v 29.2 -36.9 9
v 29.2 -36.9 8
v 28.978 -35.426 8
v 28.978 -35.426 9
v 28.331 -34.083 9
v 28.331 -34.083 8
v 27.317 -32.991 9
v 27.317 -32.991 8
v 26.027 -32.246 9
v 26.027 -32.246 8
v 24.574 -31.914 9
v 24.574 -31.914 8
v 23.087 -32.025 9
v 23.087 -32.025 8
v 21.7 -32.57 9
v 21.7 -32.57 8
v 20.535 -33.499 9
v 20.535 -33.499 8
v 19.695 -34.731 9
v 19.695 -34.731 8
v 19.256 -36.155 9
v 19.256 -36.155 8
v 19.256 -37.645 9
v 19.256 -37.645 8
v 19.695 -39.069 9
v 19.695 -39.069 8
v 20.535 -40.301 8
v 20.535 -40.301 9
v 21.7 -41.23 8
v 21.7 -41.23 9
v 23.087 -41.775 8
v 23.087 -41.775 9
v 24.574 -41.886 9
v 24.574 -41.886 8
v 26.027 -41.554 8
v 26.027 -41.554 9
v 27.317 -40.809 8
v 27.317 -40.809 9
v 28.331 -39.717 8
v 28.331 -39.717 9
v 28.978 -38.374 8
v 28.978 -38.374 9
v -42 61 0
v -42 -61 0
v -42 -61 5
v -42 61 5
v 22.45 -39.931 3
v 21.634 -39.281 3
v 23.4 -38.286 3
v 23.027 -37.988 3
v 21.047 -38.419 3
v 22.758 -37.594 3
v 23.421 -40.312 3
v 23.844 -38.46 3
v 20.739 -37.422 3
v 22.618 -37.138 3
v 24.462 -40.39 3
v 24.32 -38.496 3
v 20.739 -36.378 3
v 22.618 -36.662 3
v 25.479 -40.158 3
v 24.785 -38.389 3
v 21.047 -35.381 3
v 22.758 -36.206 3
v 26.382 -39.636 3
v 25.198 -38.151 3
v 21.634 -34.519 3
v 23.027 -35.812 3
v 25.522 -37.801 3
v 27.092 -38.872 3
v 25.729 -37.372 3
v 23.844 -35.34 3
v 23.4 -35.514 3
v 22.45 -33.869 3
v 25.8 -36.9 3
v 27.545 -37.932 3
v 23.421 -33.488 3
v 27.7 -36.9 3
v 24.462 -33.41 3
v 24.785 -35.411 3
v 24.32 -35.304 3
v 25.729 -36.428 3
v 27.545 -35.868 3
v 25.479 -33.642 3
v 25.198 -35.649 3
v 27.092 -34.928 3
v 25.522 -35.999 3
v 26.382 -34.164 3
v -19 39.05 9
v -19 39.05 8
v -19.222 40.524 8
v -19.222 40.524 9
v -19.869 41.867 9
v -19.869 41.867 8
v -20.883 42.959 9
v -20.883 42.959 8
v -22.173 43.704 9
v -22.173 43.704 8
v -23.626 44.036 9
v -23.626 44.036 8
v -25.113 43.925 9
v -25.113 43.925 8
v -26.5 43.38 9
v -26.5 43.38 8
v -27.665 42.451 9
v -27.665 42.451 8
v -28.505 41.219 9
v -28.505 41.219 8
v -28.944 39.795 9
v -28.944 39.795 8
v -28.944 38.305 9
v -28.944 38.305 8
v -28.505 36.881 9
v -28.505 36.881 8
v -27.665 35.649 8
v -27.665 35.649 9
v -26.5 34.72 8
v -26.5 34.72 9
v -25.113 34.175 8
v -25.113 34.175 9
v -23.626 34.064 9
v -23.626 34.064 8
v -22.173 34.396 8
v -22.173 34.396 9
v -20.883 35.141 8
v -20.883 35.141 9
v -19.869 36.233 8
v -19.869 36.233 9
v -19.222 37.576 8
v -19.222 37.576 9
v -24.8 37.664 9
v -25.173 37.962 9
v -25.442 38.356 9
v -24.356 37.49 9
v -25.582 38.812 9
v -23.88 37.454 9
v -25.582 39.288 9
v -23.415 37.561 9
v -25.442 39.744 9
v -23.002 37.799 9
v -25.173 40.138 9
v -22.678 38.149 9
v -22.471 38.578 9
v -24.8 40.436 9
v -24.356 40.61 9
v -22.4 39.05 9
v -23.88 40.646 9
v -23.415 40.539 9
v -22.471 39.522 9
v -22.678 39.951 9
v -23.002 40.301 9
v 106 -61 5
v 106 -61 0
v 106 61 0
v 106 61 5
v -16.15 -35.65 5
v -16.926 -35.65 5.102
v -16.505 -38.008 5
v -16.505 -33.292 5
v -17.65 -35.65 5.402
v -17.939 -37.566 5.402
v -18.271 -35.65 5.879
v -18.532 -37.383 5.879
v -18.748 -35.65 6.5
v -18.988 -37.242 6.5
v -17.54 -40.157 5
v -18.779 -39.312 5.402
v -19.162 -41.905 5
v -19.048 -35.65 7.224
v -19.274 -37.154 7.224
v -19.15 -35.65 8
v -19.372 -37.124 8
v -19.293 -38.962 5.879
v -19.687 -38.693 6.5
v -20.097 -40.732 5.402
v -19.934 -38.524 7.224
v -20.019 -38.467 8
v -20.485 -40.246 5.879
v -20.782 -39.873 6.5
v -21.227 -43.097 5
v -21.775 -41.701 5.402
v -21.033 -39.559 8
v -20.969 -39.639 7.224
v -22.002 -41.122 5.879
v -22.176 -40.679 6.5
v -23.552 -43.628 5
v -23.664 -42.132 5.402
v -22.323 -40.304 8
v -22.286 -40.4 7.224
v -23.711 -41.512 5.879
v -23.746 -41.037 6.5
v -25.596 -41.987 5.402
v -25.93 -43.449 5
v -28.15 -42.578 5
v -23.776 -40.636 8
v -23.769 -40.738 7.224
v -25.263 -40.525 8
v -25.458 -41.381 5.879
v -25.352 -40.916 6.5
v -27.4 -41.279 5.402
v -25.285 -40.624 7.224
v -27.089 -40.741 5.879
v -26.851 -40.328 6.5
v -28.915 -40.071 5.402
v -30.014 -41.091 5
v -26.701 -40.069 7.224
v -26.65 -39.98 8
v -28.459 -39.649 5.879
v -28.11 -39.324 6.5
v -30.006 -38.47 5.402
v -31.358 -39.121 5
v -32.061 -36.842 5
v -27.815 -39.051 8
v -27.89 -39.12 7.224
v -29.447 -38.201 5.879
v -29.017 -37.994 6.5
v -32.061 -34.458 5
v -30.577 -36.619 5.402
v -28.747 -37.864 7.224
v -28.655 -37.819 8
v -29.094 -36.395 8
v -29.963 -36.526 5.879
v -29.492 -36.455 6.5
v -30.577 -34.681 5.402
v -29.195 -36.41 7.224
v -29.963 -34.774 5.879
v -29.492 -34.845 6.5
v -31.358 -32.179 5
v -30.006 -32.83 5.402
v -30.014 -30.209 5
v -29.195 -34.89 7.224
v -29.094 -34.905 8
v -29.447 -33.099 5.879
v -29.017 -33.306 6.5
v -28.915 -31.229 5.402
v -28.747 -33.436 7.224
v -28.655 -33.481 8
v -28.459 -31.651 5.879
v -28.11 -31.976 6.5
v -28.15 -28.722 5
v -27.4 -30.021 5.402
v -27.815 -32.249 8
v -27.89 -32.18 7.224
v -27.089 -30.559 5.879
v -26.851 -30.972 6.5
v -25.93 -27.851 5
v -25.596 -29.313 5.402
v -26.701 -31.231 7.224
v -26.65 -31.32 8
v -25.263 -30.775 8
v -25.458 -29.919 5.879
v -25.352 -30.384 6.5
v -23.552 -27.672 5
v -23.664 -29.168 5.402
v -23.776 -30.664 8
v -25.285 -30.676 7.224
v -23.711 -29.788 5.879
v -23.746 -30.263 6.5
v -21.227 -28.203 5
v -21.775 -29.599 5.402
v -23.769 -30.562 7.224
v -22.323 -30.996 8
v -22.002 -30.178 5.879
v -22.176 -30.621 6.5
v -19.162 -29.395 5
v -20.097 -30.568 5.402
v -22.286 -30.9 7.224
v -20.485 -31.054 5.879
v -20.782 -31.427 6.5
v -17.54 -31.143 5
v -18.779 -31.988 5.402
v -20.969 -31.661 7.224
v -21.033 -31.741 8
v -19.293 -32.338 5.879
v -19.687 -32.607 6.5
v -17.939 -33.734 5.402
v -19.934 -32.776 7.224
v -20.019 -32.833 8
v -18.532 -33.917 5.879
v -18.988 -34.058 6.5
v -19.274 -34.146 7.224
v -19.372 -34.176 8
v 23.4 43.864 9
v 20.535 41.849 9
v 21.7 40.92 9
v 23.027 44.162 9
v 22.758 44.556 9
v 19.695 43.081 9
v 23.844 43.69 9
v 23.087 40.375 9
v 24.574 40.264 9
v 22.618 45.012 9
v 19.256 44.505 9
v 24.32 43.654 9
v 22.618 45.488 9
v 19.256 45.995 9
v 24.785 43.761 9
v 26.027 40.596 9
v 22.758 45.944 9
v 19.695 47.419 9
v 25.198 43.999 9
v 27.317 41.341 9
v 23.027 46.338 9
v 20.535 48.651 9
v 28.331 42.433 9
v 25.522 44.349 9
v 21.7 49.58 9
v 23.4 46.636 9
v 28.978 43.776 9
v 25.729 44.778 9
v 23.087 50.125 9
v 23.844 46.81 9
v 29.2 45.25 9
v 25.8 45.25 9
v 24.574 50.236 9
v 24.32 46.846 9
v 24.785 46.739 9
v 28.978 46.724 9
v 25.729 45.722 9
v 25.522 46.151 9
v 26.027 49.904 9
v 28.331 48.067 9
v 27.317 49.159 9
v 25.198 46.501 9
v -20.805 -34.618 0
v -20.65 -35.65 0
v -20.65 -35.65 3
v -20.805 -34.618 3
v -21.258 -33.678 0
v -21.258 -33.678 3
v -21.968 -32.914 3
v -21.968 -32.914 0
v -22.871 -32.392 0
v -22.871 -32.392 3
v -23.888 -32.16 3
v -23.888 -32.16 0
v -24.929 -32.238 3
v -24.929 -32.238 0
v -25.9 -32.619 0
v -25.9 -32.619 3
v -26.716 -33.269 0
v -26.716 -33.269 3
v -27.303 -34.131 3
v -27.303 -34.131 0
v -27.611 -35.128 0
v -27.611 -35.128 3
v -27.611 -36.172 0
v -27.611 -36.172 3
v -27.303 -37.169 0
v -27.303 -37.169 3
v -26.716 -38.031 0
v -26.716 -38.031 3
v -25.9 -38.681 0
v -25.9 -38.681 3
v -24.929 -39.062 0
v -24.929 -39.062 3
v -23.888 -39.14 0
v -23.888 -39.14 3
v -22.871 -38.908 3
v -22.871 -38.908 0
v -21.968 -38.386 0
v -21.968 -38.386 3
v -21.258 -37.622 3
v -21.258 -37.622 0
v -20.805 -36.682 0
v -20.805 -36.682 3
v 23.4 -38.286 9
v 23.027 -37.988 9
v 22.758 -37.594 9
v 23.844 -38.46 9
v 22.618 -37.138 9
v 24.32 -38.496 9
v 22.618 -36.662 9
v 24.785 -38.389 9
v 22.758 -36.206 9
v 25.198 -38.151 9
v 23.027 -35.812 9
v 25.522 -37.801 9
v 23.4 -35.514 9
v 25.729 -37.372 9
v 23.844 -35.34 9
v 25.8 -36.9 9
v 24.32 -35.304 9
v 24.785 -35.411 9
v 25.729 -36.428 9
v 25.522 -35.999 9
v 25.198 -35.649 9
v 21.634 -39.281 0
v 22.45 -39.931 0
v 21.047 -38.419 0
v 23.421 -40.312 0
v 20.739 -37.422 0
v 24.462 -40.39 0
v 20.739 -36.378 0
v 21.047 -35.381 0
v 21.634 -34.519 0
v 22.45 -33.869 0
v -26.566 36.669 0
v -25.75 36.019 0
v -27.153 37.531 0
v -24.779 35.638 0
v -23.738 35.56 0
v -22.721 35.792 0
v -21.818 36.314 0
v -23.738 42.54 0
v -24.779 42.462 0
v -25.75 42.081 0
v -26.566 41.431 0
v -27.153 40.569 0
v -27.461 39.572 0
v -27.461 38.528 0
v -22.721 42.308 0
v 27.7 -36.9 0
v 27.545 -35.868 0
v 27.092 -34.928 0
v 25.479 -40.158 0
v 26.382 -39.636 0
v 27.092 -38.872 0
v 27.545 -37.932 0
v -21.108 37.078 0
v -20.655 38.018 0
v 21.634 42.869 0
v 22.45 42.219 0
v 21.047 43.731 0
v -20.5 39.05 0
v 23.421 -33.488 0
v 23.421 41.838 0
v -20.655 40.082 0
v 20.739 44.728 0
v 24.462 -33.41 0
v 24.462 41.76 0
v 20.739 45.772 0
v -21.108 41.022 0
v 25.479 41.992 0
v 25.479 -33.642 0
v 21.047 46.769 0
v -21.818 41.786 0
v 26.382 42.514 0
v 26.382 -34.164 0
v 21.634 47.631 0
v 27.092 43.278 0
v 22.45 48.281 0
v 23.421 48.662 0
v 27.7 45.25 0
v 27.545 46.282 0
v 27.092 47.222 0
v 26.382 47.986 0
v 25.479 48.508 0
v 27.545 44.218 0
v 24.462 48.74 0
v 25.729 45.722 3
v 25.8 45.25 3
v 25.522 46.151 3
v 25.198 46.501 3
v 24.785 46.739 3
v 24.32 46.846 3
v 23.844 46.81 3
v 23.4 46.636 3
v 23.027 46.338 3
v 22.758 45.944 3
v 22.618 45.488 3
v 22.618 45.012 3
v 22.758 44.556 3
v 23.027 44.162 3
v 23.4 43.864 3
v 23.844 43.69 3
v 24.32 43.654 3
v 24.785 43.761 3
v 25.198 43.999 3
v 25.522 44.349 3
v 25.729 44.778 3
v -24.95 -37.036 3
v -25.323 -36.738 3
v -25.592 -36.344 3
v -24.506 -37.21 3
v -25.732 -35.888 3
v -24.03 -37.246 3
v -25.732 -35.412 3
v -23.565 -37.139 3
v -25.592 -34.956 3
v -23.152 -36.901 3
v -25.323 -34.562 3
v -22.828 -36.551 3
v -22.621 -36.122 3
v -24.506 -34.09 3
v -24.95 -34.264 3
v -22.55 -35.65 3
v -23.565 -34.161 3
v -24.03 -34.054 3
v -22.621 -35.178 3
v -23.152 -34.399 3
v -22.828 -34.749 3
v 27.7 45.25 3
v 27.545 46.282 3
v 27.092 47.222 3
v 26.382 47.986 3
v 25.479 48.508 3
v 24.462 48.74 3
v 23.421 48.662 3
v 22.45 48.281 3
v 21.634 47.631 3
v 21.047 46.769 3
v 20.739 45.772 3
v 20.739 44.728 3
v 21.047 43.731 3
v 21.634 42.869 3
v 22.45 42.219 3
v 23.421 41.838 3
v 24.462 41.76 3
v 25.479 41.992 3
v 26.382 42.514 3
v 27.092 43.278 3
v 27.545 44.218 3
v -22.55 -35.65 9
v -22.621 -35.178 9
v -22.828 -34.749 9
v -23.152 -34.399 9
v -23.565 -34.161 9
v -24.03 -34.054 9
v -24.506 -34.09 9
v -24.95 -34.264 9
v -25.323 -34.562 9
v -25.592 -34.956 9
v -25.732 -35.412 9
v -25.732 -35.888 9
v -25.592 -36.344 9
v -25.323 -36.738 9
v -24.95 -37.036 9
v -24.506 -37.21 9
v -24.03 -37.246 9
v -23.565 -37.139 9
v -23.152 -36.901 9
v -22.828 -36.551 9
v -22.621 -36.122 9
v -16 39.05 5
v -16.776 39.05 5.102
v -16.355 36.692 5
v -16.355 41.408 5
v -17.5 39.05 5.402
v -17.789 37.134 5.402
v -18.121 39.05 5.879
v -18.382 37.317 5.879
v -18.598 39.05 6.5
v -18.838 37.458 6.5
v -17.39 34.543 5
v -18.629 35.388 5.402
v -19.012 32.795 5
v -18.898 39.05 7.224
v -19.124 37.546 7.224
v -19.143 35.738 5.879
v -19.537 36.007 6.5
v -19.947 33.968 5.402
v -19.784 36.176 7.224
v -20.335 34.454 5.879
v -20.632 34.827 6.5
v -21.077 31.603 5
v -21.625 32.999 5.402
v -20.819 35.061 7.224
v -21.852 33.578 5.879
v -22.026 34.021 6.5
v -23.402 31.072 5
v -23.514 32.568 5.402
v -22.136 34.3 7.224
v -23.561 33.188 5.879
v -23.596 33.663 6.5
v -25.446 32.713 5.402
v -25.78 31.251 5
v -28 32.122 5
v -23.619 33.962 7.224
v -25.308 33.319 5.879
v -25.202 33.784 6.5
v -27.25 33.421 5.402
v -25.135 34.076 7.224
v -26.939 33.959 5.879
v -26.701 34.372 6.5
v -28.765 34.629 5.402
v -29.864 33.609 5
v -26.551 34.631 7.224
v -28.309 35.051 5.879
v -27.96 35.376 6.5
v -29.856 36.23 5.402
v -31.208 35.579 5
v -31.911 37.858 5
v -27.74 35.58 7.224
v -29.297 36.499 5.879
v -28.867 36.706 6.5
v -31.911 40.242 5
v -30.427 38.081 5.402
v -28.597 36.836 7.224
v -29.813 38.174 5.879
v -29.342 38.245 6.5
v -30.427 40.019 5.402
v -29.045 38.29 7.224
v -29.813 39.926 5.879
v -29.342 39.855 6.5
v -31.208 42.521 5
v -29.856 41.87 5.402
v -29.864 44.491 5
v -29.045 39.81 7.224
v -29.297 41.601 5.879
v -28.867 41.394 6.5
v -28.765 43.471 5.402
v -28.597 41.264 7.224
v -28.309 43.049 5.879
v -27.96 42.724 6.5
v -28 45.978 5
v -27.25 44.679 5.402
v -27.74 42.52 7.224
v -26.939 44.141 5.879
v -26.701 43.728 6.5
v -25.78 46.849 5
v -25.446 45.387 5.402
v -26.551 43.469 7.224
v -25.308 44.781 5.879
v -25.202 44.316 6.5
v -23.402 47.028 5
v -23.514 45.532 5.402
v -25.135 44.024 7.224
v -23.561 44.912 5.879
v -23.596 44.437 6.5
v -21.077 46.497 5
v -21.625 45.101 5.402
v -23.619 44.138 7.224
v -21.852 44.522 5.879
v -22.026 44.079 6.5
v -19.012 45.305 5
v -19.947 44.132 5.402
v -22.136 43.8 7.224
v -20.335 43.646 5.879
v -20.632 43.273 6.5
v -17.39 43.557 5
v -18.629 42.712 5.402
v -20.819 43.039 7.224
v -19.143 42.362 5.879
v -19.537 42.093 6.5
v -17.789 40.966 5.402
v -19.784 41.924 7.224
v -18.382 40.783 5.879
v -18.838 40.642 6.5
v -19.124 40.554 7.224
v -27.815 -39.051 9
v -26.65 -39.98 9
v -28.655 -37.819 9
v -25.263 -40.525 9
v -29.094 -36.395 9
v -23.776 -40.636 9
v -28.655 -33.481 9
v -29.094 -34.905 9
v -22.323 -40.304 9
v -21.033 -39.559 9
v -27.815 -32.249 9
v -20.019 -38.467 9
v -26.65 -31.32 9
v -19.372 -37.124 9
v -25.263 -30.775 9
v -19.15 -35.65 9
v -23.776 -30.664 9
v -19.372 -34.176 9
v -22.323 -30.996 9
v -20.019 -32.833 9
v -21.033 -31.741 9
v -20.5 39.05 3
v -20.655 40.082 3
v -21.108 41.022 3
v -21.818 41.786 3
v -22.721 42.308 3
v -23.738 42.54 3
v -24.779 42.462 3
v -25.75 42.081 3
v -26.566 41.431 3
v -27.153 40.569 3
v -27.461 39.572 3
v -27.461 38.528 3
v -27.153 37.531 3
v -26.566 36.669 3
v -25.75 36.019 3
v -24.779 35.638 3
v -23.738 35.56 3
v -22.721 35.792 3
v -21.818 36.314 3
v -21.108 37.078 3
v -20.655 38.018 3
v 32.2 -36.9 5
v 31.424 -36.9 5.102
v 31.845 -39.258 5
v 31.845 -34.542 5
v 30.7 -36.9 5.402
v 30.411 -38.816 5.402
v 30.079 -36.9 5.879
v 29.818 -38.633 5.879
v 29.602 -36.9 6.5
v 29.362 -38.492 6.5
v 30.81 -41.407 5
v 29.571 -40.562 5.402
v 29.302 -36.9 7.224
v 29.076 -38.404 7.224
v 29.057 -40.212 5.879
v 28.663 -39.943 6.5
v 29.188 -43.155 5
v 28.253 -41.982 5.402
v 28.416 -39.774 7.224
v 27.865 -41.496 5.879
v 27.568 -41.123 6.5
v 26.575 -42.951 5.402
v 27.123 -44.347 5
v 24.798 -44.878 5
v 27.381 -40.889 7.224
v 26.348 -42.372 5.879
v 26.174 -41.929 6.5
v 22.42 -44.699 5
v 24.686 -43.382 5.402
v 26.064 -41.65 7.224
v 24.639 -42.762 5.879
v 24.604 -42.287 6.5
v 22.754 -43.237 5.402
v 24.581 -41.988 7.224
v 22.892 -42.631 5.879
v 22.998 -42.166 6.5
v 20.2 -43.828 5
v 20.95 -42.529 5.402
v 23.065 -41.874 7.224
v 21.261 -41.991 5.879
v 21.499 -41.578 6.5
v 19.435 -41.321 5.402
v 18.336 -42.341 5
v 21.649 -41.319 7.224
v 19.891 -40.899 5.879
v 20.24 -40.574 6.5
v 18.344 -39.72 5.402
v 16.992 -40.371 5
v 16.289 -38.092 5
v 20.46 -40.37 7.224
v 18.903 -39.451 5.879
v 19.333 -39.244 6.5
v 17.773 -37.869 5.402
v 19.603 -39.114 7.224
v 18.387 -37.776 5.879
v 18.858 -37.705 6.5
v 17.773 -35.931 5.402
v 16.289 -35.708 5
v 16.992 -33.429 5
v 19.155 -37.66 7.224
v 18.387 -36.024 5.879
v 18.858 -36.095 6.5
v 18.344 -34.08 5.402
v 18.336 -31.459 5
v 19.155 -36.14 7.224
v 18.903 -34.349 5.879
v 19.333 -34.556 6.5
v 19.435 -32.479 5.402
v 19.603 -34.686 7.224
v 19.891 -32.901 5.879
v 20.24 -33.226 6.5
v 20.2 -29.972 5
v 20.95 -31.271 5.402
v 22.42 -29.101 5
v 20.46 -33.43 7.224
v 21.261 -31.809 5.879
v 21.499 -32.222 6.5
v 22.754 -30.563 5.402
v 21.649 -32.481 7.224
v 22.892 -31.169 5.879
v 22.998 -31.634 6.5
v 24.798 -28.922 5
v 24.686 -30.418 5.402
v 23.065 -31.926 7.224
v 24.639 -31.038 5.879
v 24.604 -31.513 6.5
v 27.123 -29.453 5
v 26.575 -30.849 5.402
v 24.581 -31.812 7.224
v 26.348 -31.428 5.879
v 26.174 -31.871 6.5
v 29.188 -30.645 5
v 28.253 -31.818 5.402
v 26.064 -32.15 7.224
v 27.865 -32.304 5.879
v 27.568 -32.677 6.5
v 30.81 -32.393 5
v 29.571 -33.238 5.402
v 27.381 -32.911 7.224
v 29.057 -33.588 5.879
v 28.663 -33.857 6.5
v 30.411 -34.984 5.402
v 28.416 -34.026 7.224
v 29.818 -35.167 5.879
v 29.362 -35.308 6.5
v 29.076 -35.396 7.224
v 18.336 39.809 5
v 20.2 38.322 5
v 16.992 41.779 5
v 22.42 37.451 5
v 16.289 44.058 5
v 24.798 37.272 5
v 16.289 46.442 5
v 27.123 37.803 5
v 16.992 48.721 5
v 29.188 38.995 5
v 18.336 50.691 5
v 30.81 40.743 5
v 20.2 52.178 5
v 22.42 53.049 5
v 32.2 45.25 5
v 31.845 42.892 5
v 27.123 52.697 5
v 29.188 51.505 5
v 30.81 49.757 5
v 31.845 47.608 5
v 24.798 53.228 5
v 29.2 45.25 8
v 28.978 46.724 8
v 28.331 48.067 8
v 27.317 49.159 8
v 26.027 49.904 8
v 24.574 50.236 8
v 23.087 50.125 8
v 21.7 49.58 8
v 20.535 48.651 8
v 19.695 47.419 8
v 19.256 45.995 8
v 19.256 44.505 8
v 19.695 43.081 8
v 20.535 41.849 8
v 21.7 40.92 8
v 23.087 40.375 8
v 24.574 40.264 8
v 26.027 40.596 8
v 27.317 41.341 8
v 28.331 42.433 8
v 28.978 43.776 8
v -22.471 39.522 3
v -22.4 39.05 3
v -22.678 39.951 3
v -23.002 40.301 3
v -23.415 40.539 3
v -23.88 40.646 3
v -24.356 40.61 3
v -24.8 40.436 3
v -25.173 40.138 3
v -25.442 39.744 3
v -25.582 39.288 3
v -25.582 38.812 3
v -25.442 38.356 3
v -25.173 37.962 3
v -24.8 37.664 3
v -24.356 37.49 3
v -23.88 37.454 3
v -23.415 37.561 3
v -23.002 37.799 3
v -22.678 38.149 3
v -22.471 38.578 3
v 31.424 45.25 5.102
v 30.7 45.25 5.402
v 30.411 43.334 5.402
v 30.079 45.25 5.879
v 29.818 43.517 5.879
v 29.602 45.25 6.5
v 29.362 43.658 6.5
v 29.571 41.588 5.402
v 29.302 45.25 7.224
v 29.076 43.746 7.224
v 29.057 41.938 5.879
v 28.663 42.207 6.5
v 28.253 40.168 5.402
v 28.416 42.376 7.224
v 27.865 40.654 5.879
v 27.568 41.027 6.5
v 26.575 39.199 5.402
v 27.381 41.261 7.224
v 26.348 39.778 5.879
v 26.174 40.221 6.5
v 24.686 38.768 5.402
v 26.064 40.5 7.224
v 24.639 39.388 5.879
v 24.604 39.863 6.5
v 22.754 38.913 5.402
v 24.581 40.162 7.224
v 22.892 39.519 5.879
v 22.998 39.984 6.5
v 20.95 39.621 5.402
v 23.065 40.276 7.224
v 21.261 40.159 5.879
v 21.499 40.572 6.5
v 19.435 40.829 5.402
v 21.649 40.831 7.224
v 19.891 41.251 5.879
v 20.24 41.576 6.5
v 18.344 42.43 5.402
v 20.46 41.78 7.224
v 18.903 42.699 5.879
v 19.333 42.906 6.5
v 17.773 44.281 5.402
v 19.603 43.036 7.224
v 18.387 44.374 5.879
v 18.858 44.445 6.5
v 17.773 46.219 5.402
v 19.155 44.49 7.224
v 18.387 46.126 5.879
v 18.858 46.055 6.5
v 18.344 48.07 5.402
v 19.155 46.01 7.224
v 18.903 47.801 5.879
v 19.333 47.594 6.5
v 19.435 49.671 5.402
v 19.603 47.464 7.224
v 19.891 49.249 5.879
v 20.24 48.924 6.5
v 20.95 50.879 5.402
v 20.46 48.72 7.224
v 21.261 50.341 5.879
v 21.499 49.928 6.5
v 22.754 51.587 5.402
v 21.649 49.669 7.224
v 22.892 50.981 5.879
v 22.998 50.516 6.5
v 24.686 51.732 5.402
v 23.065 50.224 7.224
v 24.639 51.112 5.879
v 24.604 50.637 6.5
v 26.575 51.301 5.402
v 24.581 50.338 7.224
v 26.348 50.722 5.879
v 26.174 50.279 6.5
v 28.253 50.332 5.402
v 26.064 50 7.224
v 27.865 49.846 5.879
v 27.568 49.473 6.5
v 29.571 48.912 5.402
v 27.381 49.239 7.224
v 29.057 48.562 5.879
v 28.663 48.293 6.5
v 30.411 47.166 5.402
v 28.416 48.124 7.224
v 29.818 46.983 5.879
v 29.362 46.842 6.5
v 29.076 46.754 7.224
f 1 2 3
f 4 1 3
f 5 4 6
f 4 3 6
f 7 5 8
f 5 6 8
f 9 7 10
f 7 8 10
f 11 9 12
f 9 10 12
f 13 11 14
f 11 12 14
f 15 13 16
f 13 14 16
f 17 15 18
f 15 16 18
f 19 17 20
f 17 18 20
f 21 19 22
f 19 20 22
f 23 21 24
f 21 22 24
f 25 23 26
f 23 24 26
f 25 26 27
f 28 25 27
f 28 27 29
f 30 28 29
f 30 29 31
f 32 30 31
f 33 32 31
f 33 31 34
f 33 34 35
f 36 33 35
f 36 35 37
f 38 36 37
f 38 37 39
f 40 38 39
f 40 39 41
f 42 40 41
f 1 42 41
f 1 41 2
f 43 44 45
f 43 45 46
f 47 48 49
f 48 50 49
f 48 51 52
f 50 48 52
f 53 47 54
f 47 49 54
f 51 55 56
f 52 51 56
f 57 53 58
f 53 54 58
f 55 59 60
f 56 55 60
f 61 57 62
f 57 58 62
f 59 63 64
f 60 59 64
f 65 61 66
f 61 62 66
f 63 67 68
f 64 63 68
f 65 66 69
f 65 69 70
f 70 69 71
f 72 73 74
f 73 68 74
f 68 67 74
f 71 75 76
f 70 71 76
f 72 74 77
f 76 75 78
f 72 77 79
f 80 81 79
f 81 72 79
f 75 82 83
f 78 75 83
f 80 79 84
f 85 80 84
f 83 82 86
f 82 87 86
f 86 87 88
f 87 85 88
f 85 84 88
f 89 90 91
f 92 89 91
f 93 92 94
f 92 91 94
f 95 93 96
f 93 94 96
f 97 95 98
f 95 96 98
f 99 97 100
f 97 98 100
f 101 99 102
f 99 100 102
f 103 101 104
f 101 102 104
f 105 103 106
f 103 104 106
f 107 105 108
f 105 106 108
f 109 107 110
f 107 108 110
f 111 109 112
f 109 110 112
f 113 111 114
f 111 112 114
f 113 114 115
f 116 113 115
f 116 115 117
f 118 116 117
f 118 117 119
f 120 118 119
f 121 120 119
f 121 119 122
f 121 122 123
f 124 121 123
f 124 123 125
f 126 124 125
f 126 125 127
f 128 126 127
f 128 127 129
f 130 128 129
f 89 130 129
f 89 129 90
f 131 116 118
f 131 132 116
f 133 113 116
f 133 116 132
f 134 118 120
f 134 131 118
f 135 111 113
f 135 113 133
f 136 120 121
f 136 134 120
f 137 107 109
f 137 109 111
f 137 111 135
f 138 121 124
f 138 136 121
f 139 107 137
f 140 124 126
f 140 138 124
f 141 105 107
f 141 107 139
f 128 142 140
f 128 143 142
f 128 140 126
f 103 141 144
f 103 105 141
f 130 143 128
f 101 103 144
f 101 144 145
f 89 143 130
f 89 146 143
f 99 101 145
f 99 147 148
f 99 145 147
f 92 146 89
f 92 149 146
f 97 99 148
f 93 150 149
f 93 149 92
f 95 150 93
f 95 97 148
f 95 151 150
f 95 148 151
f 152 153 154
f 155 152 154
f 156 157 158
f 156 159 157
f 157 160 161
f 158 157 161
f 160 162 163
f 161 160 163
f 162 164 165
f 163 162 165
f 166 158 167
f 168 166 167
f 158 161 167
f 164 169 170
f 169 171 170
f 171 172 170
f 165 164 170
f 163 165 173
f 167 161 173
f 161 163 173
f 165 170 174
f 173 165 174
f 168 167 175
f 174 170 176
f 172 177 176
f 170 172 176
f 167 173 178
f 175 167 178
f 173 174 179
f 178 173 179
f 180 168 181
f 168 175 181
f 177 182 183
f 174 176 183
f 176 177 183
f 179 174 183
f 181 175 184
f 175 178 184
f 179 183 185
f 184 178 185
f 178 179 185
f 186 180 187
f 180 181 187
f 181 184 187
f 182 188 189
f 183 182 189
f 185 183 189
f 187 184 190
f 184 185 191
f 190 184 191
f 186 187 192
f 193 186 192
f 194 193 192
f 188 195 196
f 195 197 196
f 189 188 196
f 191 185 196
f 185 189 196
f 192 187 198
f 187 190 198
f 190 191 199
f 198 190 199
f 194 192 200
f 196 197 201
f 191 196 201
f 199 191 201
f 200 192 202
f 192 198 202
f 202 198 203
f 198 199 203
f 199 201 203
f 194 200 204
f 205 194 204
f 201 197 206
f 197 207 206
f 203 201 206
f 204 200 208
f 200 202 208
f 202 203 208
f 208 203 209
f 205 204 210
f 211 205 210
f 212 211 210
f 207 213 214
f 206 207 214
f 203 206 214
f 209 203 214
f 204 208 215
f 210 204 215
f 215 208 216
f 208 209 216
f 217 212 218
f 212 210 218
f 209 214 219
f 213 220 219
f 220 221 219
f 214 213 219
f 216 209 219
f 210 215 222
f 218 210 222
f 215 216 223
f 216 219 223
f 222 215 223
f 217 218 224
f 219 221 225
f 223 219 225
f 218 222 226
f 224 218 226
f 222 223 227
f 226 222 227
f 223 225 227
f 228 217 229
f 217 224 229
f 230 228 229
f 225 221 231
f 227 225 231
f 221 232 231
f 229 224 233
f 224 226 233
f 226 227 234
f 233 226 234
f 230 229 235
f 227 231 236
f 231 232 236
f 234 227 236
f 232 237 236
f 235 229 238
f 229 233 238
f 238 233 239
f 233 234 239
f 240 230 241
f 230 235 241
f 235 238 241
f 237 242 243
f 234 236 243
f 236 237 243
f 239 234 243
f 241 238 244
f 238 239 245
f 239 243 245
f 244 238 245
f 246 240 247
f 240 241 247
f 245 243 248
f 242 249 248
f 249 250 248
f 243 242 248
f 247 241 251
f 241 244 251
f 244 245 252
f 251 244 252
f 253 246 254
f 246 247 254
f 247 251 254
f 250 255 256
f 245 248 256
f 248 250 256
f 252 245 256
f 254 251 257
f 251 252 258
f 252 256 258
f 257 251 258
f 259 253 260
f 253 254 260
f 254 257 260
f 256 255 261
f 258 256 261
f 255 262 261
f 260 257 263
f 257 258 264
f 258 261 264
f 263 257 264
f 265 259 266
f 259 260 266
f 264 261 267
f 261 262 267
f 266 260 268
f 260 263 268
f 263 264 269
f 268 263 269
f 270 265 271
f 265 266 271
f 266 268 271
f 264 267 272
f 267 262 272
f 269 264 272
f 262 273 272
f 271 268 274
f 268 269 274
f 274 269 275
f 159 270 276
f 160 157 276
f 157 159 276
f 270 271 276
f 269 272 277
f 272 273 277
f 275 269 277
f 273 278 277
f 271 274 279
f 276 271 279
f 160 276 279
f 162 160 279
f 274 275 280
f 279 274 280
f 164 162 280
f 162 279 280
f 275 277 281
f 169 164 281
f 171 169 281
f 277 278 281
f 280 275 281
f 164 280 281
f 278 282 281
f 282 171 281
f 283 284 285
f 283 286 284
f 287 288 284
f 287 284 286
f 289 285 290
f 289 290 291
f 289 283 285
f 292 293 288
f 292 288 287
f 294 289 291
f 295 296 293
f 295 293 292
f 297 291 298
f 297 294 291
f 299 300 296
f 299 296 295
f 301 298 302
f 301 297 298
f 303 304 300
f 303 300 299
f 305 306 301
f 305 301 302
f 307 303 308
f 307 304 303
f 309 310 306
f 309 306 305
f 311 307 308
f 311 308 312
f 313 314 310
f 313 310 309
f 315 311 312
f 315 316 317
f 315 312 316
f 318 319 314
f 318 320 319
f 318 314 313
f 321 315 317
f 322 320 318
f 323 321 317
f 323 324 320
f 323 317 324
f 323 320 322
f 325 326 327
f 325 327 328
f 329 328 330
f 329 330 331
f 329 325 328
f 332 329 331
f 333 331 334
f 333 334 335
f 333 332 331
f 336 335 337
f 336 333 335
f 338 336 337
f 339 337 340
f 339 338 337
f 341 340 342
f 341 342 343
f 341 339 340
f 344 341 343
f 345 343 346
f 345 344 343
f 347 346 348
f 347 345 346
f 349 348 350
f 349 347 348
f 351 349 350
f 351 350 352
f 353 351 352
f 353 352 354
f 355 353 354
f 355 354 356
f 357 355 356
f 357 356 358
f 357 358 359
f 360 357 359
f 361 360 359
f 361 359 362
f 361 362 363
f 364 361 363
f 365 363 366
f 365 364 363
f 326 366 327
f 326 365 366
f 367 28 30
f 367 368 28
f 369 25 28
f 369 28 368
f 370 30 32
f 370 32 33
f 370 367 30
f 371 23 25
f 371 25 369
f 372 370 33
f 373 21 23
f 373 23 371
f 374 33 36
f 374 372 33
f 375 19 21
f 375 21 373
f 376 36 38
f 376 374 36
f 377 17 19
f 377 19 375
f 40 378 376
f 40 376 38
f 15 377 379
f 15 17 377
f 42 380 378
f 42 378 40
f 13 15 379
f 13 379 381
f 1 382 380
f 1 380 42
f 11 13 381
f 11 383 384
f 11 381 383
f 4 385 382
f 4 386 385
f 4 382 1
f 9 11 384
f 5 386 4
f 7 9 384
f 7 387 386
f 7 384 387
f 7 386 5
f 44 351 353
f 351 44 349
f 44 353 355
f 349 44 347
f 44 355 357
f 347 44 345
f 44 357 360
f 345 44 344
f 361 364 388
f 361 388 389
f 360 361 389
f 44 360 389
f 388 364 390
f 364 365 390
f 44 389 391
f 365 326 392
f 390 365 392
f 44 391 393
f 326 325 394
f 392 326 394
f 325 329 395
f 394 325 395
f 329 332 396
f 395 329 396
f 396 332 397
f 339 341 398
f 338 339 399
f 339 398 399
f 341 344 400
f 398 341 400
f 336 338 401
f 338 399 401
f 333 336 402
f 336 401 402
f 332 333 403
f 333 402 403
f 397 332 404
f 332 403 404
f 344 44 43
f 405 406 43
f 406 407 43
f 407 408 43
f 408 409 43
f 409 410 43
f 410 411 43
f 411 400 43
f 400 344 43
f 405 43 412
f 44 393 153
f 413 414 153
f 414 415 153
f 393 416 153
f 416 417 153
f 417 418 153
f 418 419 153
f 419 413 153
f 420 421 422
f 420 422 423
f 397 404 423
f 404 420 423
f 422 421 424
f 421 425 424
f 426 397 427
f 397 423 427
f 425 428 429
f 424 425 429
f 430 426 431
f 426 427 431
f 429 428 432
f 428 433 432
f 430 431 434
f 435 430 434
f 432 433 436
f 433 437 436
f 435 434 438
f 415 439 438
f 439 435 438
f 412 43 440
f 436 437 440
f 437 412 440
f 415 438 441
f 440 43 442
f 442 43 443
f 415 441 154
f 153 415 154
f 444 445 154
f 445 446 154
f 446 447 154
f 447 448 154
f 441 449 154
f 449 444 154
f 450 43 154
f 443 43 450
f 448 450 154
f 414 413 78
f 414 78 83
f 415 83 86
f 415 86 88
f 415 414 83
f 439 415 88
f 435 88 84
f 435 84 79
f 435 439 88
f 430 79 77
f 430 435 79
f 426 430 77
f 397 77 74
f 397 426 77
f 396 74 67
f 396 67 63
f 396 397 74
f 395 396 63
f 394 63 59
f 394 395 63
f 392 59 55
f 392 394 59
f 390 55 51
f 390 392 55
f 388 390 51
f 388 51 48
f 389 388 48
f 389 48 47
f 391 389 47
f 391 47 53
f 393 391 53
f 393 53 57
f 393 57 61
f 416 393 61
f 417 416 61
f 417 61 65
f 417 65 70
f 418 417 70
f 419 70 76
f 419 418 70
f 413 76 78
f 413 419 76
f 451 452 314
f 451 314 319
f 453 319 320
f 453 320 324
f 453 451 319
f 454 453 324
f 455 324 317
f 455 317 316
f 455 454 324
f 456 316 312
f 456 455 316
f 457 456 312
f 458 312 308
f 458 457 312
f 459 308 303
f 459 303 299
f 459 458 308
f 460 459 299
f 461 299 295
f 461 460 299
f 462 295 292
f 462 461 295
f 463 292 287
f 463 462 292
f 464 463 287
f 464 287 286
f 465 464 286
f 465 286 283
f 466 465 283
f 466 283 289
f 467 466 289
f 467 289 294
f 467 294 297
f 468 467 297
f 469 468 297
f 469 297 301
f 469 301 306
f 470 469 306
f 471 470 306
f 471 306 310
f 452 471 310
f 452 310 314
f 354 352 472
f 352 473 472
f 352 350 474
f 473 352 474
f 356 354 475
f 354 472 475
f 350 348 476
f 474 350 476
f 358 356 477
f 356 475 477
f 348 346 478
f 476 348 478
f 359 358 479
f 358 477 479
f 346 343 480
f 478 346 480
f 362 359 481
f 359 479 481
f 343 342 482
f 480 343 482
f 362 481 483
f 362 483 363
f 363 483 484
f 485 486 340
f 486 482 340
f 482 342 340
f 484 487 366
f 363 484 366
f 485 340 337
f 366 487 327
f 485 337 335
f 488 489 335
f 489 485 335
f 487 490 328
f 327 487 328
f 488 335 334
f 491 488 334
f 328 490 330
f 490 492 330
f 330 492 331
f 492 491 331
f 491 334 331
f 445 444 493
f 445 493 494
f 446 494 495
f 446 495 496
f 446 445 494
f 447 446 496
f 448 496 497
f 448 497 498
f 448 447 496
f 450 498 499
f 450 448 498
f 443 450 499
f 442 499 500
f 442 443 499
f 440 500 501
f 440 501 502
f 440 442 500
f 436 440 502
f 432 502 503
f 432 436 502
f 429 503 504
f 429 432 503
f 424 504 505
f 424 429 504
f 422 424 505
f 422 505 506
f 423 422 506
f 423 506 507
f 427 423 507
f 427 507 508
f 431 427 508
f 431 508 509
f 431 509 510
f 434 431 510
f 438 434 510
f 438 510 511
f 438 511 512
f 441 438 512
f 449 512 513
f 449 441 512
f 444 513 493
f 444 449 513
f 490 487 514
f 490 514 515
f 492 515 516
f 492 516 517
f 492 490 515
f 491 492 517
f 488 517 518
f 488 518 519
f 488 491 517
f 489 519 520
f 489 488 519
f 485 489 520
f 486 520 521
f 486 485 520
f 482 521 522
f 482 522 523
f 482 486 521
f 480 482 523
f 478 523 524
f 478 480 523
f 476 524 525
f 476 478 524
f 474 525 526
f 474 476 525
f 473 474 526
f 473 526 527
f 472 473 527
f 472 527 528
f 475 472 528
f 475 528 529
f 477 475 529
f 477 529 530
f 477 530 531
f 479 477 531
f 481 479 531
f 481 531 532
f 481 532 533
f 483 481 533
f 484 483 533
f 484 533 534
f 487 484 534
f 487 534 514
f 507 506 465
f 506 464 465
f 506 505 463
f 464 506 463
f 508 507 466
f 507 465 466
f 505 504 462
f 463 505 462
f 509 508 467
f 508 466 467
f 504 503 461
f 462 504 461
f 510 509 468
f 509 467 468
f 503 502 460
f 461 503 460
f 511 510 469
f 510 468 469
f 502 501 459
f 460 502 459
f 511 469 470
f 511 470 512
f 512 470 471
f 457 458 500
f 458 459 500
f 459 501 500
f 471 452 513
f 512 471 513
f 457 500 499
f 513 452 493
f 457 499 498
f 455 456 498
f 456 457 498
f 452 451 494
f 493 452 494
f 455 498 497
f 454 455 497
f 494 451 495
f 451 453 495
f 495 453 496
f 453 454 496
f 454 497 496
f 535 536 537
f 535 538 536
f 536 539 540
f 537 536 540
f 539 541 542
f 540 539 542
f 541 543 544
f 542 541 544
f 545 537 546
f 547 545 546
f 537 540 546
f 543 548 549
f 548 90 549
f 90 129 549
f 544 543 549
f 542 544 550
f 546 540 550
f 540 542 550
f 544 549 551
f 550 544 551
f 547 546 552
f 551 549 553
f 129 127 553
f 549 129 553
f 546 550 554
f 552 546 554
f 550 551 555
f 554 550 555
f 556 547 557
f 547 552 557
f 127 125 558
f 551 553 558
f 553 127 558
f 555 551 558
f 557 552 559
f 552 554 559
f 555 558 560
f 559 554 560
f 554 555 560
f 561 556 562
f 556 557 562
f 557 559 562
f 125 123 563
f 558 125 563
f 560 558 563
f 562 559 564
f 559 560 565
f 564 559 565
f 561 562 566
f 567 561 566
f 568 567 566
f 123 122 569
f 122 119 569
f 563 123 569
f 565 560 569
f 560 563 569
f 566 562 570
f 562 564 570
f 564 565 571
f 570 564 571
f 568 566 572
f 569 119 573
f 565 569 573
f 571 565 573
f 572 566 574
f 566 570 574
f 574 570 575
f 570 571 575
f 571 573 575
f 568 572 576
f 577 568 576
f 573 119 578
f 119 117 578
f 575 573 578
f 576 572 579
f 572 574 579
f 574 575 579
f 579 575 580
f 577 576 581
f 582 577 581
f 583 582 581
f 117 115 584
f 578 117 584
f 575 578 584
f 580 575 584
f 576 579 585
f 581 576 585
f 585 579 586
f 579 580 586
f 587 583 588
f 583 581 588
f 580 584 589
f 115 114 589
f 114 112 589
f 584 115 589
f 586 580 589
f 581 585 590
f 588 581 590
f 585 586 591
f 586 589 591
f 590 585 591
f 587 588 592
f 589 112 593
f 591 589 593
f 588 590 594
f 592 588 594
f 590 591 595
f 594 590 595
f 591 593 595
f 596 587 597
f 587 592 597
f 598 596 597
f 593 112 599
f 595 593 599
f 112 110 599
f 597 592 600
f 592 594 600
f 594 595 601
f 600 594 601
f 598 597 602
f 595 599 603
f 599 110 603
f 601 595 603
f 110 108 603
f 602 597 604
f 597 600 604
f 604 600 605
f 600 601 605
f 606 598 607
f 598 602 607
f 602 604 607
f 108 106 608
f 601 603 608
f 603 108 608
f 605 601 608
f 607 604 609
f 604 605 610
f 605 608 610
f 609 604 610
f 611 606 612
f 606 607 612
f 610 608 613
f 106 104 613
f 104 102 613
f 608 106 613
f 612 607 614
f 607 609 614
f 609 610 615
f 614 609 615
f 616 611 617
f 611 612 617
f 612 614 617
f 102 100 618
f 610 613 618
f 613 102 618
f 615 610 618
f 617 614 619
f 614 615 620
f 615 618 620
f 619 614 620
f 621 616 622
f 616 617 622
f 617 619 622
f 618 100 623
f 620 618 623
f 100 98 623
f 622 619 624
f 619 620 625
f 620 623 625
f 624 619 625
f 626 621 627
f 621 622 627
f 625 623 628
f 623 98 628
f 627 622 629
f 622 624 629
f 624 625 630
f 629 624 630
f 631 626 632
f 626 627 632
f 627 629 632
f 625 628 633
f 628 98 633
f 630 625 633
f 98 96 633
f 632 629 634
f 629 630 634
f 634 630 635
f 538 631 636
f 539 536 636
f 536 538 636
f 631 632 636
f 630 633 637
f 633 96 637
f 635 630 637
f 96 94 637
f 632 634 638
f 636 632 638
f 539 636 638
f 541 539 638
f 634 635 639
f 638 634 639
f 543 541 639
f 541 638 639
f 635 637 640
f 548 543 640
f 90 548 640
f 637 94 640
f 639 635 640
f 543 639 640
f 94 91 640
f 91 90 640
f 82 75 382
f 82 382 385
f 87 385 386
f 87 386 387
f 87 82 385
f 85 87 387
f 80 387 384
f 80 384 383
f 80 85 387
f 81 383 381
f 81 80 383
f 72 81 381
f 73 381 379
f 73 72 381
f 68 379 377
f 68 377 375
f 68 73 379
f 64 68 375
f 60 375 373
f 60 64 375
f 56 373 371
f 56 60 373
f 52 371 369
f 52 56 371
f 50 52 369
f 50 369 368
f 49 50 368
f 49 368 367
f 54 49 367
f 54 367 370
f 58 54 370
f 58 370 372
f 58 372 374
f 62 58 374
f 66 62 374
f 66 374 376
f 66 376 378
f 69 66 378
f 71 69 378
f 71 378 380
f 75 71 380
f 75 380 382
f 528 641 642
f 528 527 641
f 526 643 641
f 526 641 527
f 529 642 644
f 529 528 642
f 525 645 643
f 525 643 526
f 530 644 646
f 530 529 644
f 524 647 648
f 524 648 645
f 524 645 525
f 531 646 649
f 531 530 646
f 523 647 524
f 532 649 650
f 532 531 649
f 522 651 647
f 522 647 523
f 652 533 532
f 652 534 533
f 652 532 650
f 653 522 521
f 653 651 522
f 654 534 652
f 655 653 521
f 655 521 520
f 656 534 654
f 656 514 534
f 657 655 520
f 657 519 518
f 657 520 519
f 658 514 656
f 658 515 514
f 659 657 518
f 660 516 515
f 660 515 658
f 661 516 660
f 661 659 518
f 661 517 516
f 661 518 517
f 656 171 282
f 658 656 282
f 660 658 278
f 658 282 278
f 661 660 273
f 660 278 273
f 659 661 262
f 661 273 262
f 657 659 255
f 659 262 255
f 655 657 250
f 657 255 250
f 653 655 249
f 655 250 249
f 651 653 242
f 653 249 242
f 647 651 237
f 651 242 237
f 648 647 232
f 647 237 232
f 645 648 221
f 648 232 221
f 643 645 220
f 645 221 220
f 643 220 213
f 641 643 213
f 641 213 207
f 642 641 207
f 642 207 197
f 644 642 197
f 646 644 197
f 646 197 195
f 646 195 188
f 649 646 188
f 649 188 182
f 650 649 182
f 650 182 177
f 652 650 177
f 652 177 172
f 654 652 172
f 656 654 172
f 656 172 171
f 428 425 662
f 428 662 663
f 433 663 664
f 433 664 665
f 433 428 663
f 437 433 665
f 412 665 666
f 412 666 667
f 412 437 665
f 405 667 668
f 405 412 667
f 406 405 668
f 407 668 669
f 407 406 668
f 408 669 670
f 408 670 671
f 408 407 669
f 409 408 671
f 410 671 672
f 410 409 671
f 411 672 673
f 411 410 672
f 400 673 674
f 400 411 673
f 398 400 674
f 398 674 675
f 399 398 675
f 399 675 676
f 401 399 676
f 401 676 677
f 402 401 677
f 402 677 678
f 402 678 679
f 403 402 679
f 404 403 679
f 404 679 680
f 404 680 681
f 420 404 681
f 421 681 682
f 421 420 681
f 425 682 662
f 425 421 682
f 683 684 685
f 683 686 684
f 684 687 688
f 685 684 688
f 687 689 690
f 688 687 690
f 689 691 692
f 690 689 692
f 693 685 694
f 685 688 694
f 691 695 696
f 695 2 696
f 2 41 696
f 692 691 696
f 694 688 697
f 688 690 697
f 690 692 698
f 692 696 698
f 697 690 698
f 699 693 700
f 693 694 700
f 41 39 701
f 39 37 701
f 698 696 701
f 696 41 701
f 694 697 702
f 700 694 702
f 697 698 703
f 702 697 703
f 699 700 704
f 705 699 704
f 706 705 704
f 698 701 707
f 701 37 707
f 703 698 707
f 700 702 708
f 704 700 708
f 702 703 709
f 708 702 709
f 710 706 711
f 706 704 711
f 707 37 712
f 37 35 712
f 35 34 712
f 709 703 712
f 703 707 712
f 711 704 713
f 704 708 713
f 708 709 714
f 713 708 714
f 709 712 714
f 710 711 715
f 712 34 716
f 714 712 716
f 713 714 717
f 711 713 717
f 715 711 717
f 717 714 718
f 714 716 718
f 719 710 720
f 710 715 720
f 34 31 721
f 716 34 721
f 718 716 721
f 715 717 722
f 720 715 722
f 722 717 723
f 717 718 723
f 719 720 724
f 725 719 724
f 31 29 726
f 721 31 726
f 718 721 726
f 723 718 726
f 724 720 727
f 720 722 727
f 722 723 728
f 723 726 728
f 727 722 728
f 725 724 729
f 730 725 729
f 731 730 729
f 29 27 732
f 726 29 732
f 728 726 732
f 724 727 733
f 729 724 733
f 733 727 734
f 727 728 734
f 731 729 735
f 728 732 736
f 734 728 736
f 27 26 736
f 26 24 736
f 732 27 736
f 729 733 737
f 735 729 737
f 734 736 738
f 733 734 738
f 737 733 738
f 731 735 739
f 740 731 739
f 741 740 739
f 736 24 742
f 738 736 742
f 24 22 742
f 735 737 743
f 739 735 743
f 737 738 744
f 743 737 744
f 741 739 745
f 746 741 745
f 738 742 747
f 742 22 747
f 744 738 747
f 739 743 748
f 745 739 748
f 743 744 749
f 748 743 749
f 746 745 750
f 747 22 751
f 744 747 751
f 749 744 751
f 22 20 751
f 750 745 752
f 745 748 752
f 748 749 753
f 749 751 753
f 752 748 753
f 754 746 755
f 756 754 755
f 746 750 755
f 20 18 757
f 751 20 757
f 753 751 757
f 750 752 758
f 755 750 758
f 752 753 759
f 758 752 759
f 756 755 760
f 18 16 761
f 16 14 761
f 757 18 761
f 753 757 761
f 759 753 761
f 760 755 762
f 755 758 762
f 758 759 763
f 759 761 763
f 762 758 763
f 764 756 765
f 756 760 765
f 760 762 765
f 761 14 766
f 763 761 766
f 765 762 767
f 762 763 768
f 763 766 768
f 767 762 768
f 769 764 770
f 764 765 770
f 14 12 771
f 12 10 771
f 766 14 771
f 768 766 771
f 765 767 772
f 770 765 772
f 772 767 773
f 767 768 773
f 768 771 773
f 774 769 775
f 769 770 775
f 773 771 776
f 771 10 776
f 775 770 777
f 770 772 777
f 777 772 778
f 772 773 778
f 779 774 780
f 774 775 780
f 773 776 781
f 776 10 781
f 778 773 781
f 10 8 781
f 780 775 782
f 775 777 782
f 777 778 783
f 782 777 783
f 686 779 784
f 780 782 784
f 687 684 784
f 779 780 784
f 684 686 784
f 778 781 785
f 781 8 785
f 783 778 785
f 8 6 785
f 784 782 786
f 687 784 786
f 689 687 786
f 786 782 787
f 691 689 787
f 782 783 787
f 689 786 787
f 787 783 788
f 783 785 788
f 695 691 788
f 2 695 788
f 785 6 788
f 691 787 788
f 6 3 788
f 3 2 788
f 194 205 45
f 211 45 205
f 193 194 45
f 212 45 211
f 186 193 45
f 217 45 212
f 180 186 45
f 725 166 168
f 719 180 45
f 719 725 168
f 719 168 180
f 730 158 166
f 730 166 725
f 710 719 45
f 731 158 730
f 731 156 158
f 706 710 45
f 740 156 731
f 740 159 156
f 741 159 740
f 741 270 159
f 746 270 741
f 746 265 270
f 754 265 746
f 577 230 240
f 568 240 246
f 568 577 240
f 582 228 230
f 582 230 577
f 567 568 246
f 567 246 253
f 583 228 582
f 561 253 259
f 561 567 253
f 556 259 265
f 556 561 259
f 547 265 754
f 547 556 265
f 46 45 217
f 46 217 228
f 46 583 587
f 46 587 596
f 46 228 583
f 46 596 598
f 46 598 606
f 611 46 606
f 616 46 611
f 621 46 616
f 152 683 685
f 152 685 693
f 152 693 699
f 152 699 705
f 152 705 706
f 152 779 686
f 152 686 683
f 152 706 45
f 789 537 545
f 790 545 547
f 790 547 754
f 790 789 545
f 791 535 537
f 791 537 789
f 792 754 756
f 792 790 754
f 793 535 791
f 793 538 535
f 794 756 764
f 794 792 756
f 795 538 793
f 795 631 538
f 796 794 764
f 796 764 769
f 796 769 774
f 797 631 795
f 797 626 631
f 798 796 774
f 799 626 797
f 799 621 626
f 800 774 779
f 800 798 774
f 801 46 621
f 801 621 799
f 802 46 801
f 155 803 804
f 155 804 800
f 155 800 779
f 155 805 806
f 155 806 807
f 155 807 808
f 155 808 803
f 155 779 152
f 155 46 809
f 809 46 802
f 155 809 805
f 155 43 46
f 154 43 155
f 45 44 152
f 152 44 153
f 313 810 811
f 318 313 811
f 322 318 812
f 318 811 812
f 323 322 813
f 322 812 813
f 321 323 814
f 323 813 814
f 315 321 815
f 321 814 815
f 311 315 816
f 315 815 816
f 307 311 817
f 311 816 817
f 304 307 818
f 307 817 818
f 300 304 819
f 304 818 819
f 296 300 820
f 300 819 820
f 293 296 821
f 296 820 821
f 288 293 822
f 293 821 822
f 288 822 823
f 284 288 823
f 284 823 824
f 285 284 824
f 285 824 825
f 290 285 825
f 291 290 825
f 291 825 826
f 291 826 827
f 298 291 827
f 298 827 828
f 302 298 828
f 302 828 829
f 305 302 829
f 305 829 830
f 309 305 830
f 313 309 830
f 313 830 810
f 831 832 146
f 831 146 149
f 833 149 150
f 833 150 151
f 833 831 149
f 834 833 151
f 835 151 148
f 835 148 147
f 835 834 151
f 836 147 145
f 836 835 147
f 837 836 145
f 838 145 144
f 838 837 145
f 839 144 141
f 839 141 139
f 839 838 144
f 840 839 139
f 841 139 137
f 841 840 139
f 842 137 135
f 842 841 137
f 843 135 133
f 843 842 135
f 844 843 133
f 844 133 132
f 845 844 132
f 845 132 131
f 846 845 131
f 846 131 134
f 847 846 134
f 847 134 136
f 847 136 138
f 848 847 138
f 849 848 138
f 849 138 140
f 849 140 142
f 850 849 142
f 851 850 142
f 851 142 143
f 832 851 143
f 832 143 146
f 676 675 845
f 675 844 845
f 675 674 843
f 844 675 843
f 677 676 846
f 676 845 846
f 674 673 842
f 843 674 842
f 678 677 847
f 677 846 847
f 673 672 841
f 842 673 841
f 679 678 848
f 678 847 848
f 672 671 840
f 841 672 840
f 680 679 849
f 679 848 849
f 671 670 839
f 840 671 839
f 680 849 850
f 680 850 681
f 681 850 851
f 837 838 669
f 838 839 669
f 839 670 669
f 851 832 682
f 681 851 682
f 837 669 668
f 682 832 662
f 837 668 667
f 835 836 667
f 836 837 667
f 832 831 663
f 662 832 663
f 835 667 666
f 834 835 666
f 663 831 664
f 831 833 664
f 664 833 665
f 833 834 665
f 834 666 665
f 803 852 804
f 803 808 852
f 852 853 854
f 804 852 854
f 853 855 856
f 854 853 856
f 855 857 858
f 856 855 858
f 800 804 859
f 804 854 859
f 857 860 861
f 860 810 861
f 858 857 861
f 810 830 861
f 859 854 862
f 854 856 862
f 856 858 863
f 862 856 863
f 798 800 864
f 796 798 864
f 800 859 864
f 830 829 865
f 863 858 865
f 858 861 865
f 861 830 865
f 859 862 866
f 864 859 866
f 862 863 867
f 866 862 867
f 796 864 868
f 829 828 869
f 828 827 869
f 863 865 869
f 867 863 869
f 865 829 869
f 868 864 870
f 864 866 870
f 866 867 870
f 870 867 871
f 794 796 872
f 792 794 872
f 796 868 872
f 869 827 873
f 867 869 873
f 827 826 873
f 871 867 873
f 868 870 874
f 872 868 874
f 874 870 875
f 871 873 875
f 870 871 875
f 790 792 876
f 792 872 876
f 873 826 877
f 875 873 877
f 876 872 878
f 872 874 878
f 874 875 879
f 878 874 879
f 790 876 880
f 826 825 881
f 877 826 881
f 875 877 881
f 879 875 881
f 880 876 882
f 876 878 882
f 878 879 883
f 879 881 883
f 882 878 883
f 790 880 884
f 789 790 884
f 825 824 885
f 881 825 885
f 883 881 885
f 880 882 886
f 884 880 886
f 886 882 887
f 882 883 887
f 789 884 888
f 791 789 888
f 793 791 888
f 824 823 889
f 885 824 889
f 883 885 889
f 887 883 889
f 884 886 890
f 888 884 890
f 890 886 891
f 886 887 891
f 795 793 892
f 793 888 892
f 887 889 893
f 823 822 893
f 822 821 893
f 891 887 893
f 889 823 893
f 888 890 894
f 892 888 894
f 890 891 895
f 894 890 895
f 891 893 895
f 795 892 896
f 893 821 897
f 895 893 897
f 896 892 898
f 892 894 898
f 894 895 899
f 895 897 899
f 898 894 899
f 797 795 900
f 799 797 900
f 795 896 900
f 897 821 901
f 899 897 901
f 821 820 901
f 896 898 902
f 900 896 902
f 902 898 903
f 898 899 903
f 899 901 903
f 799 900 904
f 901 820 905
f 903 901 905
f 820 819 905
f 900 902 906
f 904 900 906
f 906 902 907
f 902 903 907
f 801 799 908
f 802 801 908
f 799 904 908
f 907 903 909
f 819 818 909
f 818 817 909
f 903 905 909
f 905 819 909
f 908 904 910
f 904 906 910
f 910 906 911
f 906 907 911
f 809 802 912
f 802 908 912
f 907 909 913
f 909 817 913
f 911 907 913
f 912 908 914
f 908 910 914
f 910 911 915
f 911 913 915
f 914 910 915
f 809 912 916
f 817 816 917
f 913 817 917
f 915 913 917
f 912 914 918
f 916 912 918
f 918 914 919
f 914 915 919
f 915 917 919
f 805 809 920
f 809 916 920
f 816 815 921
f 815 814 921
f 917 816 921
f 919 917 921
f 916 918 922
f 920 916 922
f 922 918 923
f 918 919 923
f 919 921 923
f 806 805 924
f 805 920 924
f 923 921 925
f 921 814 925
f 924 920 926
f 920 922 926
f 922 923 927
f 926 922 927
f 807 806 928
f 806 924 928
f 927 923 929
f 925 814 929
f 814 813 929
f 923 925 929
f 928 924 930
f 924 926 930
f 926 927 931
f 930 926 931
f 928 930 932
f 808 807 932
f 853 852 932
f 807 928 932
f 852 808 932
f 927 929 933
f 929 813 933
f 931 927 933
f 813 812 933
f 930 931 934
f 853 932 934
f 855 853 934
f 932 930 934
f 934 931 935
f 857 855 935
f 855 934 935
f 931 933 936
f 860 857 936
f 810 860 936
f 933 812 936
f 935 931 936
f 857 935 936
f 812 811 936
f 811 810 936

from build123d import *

# Parameters (mm, degrees)
F0_W     = 148
F0_H     = 122
F0_W_2   = 64
F0_H_2   = 102
F0_W_3   = 54
F0_H_3   = 82
F0_R     = 5
F0_R_2   = 3.5
F0_R_3   = 1.6
F1_DEPTH = 5
F2_DEPTH = 9
F3_DEPTH = 3
F4_R     = 3


with BuildPart() as f1:
    # F0 (on Top) → F1 (new body)
    with BuildSketch(Plane.XY):
        with Locations((32, 0)):
            Rectangle(F0_W, F0_H)
        Rectangle(F0_W_2, F0_H_2, mode=Mode.SUBTRACT)
        with Locations((69, 0)):
            Rectangle(F0_W_3, F0_H_3, mode=Mode.SUBTRACT)
        Rectangle(F0_W_2, F0_H_2)
        with Locations((-24.15, -35.65)):
            Circle(F0_R, mode=Mode.SUBTRACT)
        with Locations((24.2, -36.9)):
            Circle(F0_R, mode=Mode.SUBTRACT)
        with Locations((-24, 39.05)):
            Circle(F0_R, mode=Mode.SUBTRACT)
        with Locations((24.2, 45.25)):
            Circle(F0_R, mode=Mode.SUBTRACT)
        with Locations((69, 0)):
            Rectangle(F0_W_3, F0_H_3)
        with Locations((24.2, -36.9)):
            Circle(F0_R)
        with Locations((24.2, -36.9)):
            Circle(F0_R_2, mode=Mode.SUBTRACT)
        with Locations((-24.15, -35.65)):
            Circle(F0_R)
        with Locations((-24.15, -35.65)):
            Circle(F0_R_2, mode=Mode.SUBTRACT)
        with Locations((-24, 39.05)):
            Circle(F0_R)
        with Locations((-24, 39.05)):
            Circle(F0_R_2, mode=Mode.SUBTRACT)
        with Locations((24.2, 45.25)):
            Circle(F0_R)
        with Locations((24.2, 45.25)):
            Circle(F0_R_2, mode=Mode.SUBTRACT)
        with Locations((-24.15, -35.65)):
            Circle(F0_R_2)
        with Locations((-24.15, -35.65)):
            Circle(F0_R_3, mode=Mode.SUBTRACT)
        with Locations((24.2, -36.9)):
            Circle(F0_R_2)
        with Locations((24.2, -36.9)):
            Circle(F0_R_3, mode=Mode.SUBTRACT)
        with Locations((24.2, 45.25)):
            Circle(F0_R_2)
        with Locations((24.2, 45.25)):
            Circle(F0_R_3, mode=Mode.SUBTRACT)
        with Locations((-24, 39.05)):
            Circle(F0_R_2)
        with Locations((-24, 39.05)):
            Circle(F0_R_3, mode=Mode.SUBTRACT)
    extrude(amount=F1_DEPTH)

    # F0 (on Top) → F2 (join)
    with BuildSketch(Plane.XY):
        with Locations((24.2, -36.9)):
            Circle(F0_R)
        with Locations((24.2, -36.9)):
            Circle(F0_R_2, mode=Mode.SUBTRACT)
        with Locations((-24.15, -35.65)):
            Circle(F0_R)
        with Locations((-24.15, -35.65)):
            Circle(F0_R_2, mode=Mode.SUBTRACT)
        with Locations((-24, 39.05)):
            Circle(F0_R)
        with Locations((-24, 39.05)):
            Circle(F0_R_2, mode=Mode.SUBTRACT)
        with Locations((24.2, 45.25)):
            Circle(F0_R)
        with Locations((24.2, 45.25)):
            Circle(F0_R_2, mode=Mode.SUBTRACT)
        with Locations((-24, 39.05)):
            Circle(F0_R_2)
        with Locations((-24, 39.05)):
            Circle(F0_R_3, mode=Mode.SUBTRACT)
        with Locations((24.2, 45.25)):
            Circle(F0_R_2)
        with Locations((24.2, 45.25)):
            Circle(F0_R_3, mode=Mode.SUBTRACT)
        with Locations((24.2, -36.9)):
            Circle(F0_R_2)
        with Locations((24.2, -36.9)):
            Circle(F0_R_3, mode=Mode.SUBTRACT)
        with Locations((-24.15, -35.65)):
            Circle(F0_R_2)
        with Locations((-24.15, -35.65)):
            Circle(F0_R_3, mode=Mode.SUBTRACT)
    extrude(amount=F2_DEPTH)

    # F0 (on Top) → F3 (cut)
    with BuildSketch(Plane.XY):
        with Locations((24.2, -36.9)):
            Circle(F0_R_2)
        with Locations((24.2, -36.9)):
            Circle(F0_R_3, mode=Mode.SUBTRACT)
        with Locations((-24.15, -35.65)):
            Circle(F0_R_2)
        with Locations((-24.15, -35.65)):
            Circle(F0_R_3, mode=Mode.SUBTRACT)
        with Locations((-24, 39.05)):
            Circle(F0_R_2)
        with Locations((-24, 39.05)):
            Circle(F0_R_3, mode=Mode.SUBTRACT)
        with Locations((24.2, 45.25)):
            Circle(F0_R_2)
        with Locations((24.2, 45.25)):
            Circle(F0_R_3, mode=Mode.SUBTRACT)
    extrude(amount=F3_DEPTH, mode=Mode.SUBTRACT)

    # F4
    f4_edges = [f1.edges().sort_by_distance(p)[0] for p in [
        (19.2, -36.9, 5),
        (19.2, 45.25, 5),
        (-29.15, -35.65, 5),
        (-29, 39.05, 5),
    ]]
    fillet(f4_edges, radius=F4_R)


solid = f1.part
